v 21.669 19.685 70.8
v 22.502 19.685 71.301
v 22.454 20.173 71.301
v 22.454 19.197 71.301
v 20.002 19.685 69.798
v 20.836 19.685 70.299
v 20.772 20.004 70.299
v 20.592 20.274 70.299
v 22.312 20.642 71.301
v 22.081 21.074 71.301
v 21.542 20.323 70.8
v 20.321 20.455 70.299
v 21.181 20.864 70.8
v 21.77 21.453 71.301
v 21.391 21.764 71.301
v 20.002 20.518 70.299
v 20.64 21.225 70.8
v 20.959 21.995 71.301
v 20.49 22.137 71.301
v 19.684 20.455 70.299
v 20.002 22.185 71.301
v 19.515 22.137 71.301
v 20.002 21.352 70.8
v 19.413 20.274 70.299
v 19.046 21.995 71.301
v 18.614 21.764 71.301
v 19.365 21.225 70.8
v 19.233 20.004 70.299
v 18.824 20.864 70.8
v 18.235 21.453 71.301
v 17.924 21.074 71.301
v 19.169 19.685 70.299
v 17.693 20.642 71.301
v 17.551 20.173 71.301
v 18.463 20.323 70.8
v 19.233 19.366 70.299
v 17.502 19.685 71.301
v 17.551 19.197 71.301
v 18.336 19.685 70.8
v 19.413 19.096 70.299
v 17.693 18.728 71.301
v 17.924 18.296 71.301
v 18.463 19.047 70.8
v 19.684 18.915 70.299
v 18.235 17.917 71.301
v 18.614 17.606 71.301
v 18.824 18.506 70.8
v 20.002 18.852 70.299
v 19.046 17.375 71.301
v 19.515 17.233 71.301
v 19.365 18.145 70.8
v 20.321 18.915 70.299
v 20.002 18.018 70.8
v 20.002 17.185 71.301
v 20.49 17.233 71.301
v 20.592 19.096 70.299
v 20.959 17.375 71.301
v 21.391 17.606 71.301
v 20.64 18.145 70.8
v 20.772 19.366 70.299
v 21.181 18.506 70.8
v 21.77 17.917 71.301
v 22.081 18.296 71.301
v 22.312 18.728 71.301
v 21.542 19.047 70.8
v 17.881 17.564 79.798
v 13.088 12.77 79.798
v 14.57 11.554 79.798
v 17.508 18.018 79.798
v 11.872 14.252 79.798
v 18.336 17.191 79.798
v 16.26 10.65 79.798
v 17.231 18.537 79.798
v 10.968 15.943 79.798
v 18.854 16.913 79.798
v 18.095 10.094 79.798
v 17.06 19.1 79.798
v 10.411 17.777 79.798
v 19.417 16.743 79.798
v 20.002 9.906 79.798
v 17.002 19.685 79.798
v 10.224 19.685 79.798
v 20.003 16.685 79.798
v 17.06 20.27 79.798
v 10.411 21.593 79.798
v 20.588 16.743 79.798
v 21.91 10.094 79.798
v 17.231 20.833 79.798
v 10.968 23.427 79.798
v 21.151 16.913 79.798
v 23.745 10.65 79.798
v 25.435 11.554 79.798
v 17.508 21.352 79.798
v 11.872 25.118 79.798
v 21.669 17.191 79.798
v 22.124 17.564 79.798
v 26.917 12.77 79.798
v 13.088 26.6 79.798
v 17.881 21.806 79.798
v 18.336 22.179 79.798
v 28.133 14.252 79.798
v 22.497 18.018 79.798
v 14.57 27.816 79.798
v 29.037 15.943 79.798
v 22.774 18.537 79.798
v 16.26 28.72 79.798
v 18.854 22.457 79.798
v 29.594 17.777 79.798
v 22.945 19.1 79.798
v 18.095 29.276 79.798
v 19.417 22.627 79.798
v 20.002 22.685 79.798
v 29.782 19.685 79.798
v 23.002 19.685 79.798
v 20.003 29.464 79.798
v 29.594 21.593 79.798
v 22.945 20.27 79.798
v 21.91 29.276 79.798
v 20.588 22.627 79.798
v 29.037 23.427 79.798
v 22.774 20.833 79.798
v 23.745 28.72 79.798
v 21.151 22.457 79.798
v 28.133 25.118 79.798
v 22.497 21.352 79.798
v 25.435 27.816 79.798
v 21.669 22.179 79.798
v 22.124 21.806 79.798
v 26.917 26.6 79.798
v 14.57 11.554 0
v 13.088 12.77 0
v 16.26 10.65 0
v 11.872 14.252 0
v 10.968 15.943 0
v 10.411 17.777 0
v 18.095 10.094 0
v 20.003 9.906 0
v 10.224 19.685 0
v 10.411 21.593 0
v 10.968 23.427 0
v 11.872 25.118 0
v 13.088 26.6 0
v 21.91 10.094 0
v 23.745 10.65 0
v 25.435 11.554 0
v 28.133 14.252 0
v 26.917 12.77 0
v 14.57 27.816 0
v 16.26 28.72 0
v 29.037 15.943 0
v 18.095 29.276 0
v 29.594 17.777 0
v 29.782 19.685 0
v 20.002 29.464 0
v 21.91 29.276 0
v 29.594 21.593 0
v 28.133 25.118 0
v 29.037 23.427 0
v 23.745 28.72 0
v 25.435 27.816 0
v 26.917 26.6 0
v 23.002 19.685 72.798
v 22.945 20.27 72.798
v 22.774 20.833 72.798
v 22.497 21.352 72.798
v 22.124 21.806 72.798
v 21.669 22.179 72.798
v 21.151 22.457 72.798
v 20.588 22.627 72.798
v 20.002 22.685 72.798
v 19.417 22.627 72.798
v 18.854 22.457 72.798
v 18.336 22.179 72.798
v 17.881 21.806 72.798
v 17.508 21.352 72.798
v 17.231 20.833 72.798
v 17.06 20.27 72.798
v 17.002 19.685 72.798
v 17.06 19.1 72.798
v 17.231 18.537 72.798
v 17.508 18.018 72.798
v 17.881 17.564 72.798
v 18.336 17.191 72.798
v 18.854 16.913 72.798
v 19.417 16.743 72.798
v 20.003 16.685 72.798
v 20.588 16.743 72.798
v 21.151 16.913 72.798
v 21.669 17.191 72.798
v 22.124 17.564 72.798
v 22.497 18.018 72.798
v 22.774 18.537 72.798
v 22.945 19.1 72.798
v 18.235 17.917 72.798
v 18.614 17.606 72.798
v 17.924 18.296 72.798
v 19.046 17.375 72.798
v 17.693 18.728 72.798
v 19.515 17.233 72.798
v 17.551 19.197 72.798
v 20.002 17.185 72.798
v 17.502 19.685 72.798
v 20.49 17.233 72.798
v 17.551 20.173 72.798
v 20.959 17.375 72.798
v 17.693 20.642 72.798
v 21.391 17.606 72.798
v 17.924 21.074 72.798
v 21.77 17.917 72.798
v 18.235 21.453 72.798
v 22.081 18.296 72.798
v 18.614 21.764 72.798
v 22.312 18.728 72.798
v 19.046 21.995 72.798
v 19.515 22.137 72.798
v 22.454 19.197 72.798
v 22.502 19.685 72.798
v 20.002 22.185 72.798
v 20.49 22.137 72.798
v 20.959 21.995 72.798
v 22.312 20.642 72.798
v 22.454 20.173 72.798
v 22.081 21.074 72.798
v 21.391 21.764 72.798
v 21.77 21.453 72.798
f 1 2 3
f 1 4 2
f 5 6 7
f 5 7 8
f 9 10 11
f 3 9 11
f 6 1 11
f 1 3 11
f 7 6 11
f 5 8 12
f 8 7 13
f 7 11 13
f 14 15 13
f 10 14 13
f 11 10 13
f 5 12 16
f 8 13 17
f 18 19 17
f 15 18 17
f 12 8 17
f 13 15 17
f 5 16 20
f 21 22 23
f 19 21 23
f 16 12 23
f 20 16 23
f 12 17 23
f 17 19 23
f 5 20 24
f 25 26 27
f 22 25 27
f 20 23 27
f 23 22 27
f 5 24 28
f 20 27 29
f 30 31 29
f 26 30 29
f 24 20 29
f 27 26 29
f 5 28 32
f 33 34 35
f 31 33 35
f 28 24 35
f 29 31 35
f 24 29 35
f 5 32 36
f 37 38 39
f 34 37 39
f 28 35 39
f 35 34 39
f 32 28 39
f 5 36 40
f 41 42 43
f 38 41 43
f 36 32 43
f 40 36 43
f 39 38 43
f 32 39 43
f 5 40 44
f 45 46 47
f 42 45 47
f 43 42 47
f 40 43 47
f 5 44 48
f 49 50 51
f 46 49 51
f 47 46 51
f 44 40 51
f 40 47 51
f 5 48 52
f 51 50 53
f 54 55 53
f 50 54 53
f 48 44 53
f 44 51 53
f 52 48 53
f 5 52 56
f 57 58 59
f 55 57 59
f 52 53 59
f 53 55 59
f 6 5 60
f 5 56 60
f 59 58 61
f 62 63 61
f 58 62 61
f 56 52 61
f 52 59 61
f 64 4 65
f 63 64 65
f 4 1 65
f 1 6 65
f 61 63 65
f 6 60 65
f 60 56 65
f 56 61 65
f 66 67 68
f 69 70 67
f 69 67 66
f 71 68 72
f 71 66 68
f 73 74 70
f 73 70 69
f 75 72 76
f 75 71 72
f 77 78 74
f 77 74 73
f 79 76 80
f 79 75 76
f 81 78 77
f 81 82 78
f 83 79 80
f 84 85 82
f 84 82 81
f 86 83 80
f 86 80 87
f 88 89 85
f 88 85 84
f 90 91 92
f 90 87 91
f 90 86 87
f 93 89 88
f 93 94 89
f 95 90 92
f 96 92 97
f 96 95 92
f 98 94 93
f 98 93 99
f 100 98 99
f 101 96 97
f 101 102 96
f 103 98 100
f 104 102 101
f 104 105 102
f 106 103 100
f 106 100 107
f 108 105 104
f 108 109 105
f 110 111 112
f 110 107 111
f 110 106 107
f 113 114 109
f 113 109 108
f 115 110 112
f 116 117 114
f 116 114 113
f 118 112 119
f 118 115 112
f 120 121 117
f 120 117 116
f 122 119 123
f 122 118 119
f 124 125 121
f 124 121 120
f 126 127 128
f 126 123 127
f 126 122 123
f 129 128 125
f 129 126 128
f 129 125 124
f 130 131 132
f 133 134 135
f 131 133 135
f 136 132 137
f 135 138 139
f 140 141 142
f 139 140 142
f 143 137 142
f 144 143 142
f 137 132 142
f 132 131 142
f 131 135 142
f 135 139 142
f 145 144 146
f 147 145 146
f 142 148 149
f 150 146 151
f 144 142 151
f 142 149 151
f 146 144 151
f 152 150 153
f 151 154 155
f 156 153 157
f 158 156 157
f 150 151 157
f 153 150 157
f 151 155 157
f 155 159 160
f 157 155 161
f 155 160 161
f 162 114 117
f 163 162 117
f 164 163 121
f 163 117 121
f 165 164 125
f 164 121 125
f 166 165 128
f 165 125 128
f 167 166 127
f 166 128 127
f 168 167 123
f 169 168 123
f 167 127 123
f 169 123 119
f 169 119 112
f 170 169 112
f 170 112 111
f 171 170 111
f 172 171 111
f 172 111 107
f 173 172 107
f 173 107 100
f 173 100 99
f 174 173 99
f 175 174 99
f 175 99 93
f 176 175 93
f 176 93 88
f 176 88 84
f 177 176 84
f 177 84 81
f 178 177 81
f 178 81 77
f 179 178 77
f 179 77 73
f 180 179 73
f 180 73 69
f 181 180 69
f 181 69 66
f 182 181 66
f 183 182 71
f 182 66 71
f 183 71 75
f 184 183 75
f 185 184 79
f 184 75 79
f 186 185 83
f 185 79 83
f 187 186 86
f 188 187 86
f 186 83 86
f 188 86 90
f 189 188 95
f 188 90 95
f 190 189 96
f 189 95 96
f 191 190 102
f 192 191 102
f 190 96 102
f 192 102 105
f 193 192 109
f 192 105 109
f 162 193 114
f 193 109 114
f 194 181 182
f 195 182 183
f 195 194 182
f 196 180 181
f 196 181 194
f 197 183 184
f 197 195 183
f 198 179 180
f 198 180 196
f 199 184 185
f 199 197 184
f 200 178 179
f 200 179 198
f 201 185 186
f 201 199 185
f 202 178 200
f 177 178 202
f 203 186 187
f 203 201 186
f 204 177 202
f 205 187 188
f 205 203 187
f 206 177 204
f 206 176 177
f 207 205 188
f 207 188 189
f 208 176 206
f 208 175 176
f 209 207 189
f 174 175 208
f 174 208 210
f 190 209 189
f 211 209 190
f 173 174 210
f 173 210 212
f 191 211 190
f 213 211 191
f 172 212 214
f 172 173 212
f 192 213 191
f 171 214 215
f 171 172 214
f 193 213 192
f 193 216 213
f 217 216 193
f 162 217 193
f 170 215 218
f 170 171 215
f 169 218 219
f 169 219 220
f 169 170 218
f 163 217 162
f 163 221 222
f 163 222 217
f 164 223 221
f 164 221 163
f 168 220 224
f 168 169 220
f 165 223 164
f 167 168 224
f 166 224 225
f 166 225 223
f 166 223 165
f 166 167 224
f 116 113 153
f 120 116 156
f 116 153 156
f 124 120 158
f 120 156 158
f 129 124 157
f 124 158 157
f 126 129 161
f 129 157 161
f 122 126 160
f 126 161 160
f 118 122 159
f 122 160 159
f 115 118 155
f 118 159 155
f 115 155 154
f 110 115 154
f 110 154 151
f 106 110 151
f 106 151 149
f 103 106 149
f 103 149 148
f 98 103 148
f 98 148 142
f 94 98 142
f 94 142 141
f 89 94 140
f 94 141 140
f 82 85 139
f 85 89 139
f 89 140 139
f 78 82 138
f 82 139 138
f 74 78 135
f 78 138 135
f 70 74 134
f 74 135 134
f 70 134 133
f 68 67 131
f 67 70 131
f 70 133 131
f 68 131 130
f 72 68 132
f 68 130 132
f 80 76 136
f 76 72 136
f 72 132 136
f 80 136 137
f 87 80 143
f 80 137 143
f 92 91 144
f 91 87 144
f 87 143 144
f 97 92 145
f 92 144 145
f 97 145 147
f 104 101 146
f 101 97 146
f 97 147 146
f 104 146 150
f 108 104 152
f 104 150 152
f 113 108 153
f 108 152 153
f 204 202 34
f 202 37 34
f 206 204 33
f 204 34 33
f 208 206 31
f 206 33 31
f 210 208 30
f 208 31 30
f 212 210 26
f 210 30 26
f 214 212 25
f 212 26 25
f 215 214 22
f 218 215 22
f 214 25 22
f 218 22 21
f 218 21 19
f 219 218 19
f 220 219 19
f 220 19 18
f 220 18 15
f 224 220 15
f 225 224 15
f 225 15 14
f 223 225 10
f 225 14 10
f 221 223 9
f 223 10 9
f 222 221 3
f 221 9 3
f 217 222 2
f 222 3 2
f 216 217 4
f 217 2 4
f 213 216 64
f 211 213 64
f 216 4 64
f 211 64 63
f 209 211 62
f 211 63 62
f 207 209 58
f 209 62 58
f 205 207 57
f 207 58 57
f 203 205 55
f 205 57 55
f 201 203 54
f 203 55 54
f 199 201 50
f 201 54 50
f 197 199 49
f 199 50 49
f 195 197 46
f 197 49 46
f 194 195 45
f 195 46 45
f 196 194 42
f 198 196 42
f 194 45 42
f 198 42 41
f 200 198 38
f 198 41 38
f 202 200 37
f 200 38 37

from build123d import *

# Parameters (mm, degrees)
SKETCH1_R                   = 9.779
BOSS_EXTRUDE1_DEPTH         = 92.6
SKETCH2_R                   = 3.4925
CUT_EXTRUDE1_DEPTH          = 30.7815
FILLET1_R                   = 0.254
FILLET2_R                   = 0.254
SKETCH3_R                   = 11.060223395
CUT_EXTRUDE2_DEPTH          = 12.8016
M6_TAPPED_HOLE1_D           = 5
M6_TAPPED_HOLE1_DEPTH       = 8.497848452
M6_TAPPED_HOLE1_CBORE_D     = 6
M6_TAPPED_HOLE1_CBORE_DEPTH = 7
M6_TAPPED_HOLE1_TIP         = 1.502151548


with BuildPart() as part:
    # Sketch1 → Boss-Extrude1 (new body)
    with BuildSketch(Plane.XY):
        with Locations((20.0025, 19.685)):
            Circle(SKETCH1_R)
    extrude(amount=BOSS_EXTRUDE1_DEPTH)

    # Sketch2 → Cut-Extrude1 (cut, through all)
    with BuildSketch(Plane(origin=(0, 0, 0), x_dir=(0, 0, -1), z_dir=(1, 0, 0))):
        with Locations((-83.583, 19.685)):
            Circle(SKETCH2_R)
    extrude(amount=CUT_EXTRUDE1_DEPTH, mode=Mode.SUBTRACT)

    # Fillet1
    fillet1_edges = [part.edges().sort_by_distance(p)[0] for p in [
        (29.136572736, 23.1775, 83.583),
        (10.2235, 19.685, 87.075500001),
    ]]
    fillet(fillet1_edges, radius=FILLET1_R)

    # Fillet2
    fillet2_edges = [part.edges().sort_by_distance(p)[0] for p in [
        (10.2235, 19.685, 92.6),
    ]]
    fillet(fillet2_edges, radius=FILLET2_R)

    # Sketch3 → Cut-Extrude2 (cut)
    with BuildSketch(Plane.XY.offset(92.6)):
        with Locations((20.0025, 19.685)):
            Circle(SKETCH3_R)
    extrude(amount=-CUT_EXTRUDE2_DEPTH, mode=Mode.SUBTRACT)

    # M6 Tapped Hole1
    with Locations(Plane(origin=(20.0025, 19.685, 79.7984), x_dir=(1, 0, 0), z_dir=(0, 0, 1))):
        with Locations((0, 0)):
            CounterBoreHole(M6_TAPPED_HOLE1_D / 2, M6_TAPPED_HOLE1_CBORE_D / 2, M6_TAPPED_HOLE1_CBORE_DEPTH, depth=M6_TAPPED_HOLE1_DEPTH)
            with Locations((0, 0, -(M6_TAPPED_HOLE1_DEPTH + M6_TAPPED_HOLE1_TIP / 2))):  # 118° drill point
                Cone(0, M6_TAPPED_HOLE1_D / 2, M6_TAPPED_HOLE1_TIP, mode=Mode.SUBTRACT)


solid = part.part
